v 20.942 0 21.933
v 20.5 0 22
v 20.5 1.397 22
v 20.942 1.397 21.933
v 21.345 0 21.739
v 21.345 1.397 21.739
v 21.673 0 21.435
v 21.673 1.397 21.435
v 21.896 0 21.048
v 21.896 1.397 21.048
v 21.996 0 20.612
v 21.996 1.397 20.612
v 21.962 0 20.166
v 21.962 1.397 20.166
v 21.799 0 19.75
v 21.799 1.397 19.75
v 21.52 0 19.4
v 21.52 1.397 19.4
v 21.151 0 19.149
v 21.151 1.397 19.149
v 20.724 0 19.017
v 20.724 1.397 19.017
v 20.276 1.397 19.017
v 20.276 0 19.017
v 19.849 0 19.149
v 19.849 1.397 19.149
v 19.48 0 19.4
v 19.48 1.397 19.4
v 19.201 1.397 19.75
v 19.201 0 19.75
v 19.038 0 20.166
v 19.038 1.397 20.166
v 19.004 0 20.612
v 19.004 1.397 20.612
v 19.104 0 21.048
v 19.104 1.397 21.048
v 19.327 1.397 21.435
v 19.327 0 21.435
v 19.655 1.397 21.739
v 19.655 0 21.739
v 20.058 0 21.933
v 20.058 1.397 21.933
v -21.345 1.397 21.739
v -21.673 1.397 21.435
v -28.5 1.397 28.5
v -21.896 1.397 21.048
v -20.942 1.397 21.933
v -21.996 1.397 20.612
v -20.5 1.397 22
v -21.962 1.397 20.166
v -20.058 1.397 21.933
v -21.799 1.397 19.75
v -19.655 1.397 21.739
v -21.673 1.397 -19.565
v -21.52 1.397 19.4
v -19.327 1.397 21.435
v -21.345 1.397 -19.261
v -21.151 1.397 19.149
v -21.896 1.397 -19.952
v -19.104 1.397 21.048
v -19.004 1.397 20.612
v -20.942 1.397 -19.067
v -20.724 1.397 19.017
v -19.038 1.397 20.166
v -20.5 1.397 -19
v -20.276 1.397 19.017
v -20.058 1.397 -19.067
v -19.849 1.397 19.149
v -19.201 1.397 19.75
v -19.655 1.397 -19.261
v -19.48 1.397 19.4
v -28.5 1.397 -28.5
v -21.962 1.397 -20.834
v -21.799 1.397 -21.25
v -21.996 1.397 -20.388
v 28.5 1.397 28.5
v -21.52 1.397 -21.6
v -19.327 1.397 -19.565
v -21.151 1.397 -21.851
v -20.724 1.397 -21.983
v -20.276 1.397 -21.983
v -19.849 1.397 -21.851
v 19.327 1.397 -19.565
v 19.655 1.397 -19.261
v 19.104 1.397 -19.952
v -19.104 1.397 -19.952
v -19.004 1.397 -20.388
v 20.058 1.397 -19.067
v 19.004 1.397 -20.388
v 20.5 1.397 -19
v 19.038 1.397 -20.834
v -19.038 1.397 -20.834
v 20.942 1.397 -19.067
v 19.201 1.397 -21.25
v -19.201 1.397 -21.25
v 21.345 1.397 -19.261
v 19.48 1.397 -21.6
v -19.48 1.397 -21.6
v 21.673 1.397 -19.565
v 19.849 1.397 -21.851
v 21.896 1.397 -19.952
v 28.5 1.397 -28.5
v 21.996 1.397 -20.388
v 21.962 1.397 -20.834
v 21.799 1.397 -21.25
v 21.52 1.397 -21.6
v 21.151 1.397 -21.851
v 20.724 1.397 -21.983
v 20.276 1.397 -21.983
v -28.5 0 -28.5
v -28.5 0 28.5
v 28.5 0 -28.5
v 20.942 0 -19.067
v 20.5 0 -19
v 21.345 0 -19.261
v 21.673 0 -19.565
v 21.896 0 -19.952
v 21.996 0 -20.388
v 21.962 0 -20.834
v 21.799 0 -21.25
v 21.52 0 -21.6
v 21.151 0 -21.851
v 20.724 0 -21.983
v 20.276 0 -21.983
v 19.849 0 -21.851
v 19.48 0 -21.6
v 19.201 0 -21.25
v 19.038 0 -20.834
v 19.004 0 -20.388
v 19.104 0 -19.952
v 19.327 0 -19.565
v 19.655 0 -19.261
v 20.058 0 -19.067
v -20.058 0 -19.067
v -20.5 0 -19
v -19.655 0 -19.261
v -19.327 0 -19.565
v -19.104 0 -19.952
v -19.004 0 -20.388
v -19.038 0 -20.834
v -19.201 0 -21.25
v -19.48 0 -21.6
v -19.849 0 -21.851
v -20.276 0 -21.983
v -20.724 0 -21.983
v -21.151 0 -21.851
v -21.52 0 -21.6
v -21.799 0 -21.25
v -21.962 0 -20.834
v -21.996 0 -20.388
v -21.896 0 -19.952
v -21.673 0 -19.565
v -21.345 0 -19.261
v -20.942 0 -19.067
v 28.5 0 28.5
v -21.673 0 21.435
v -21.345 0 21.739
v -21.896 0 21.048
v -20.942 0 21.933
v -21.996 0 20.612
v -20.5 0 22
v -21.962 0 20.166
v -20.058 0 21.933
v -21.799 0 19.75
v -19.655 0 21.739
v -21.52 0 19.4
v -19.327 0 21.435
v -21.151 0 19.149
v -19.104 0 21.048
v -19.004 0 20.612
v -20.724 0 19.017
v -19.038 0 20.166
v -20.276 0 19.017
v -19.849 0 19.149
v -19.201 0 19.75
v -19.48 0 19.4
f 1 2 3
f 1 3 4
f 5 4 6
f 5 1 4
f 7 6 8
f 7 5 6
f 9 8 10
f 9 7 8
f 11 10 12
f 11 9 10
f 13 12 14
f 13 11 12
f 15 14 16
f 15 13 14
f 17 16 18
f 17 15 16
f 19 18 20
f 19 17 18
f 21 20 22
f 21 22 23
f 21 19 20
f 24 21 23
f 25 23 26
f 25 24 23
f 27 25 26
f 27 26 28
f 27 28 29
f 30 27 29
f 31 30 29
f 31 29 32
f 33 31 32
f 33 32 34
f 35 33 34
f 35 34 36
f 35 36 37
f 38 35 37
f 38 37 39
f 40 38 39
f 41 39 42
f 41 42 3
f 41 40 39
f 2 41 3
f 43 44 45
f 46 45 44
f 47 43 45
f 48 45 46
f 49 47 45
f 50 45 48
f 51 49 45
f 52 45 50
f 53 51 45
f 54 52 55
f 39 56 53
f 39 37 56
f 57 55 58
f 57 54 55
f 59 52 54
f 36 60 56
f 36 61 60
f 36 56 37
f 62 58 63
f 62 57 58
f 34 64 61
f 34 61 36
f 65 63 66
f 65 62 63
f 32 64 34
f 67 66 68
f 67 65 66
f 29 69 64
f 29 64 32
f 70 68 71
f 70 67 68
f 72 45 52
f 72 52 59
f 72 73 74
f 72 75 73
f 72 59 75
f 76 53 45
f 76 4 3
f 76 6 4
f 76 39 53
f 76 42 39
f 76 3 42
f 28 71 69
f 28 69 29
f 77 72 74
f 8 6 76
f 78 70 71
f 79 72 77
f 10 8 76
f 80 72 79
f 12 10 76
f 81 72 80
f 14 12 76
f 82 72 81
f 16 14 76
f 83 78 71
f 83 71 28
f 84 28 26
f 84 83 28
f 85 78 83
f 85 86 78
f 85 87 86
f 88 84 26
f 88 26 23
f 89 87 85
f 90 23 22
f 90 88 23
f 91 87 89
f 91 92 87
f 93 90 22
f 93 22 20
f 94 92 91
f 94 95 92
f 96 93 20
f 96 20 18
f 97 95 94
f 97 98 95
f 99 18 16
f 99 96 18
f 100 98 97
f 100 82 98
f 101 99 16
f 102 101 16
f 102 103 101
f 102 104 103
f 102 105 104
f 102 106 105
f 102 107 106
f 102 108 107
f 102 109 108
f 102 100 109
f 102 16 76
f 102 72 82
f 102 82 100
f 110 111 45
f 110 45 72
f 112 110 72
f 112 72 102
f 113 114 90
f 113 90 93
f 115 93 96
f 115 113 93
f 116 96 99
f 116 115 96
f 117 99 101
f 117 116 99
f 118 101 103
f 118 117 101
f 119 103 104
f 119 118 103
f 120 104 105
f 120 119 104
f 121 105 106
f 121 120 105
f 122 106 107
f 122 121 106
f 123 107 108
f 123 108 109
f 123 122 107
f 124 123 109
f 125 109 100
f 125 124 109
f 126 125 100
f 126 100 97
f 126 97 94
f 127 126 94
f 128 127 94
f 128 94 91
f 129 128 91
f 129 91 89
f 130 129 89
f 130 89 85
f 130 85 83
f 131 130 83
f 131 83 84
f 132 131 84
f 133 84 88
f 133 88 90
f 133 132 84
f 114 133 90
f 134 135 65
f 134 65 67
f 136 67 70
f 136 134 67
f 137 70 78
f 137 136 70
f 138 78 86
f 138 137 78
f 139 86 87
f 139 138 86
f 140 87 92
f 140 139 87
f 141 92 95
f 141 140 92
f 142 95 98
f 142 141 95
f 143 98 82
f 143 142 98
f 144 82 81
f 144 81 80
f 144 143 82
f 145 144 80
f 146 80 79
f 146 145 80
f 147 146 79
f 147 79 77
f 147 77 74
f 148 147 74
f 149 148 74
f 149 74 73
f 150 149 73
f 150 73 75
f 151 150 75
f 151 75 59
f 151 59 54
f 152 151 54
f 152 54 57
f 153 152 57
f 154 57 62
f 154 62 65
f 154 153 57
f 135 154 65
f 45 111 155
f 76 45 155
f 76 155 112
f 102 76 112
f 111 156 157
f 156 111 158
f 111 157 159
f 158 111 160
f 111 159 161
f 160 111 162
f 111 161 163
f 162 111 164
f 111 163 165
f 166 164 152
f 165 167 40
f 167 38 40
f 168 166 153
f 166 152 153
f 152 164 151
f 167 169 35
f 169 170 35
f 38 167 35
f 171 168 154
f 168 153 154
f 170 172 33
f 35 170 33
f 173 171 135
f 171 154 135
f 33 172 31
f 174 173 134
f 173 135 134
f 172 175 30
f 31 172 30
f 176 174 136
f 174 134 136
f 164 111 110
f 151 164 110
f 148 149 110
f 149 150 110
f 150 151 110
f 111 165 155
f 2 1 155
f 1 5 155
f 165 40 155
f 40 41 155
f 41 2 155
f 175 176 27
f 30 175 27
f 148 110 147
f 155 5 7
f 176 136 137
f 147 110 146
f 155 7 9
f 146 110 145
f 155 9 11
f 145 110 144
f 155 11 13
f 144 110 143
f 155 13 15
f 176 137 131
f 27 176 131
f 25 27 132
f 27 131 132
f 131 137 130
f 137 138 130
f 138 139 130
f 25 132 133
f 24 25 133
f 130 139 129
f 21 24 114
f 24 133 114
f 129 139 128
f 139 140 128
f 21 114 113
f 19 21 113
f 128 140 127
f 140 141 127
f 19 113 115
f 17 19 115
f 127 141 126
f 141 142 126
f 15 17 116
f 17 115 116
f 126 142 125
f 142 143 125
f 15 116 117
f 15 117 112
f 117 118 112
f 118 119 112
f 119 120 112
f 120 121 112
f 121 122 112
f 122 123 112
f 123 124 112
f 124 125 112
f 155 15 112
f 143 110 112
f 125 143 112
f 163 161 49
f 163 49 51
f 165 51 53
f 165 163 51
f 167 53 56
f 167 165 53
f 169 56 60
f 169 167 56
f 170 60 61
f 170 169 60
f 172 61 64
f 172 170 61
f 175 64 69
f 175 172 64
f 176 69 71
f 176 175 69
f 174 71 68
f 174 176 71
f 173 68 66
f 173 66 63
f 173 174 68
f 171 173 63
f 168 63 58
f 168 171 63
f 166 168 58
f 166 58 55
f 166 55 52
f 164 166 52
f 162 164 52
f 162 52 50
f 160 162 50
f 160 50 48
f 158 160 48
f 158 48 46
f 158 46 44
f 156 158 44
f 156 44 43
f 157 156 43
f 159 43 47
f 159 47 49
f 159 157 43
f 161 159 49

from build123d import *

# Parameters (mm, degrees)
SKETCH1_W           = 57
SKETCH1_H           = 57
SKETCH1_R           = 1.5
SKETCH1_W_2         = 25
SKETCH1_H_2         = 25
BOSS_EXTRUDE1_DEPTH = 1.397


with BuildPart() as part:
    # Sketch1 → Boss-Extrude1 (new body)
    # profile 1 of 2: a face of its own
    with BuildSketch(Plane(origin=(0, 0, 0), x_dir=(1, 0, 0), z_dir=(0, 1, 0))):
        Rectangle(SKETCH1_W, SKETCH1_H)
        with Locations(Location((-20.5, -20.5, 0), (0, 0, 270))):
            Circle(SKETCH1_R, mode=Mode.SUBTRACT)
        with Locations(Location((-20.5, 20.5, 0), (0, 0, 270))):
            Circle(SKETCH1_R, mode=Mode.SUBTRACT)
        with Locations(Location((20.5, -20.5, 0), (0, 0, 270))):
            Circle(SKETCH1_R, mode=Mode.SUBTRACT)
        with Locations(Location((20.5, 20.5, 0), (0, 0, 270))):
            Circle(SKETCH1_R, mode=Mode.SUBTRACT)
        Rectangle(SKETCH1_W_2, SKETCH1_H_2, mode=Mode.SUBTRACT)
    # profile 2 of 2: a face of its own
    with BuildSketch(Plane(origin=(0, 0, 0), x_dir=(1, 0, 0), z_dir=(0, 1, 0))):
        Rectangle(SKETCH1_W_2, SKETCH1_H_2)
    extrude(amount=BOSS_EXTRUDE1_DEPTH)


solid = part.part
